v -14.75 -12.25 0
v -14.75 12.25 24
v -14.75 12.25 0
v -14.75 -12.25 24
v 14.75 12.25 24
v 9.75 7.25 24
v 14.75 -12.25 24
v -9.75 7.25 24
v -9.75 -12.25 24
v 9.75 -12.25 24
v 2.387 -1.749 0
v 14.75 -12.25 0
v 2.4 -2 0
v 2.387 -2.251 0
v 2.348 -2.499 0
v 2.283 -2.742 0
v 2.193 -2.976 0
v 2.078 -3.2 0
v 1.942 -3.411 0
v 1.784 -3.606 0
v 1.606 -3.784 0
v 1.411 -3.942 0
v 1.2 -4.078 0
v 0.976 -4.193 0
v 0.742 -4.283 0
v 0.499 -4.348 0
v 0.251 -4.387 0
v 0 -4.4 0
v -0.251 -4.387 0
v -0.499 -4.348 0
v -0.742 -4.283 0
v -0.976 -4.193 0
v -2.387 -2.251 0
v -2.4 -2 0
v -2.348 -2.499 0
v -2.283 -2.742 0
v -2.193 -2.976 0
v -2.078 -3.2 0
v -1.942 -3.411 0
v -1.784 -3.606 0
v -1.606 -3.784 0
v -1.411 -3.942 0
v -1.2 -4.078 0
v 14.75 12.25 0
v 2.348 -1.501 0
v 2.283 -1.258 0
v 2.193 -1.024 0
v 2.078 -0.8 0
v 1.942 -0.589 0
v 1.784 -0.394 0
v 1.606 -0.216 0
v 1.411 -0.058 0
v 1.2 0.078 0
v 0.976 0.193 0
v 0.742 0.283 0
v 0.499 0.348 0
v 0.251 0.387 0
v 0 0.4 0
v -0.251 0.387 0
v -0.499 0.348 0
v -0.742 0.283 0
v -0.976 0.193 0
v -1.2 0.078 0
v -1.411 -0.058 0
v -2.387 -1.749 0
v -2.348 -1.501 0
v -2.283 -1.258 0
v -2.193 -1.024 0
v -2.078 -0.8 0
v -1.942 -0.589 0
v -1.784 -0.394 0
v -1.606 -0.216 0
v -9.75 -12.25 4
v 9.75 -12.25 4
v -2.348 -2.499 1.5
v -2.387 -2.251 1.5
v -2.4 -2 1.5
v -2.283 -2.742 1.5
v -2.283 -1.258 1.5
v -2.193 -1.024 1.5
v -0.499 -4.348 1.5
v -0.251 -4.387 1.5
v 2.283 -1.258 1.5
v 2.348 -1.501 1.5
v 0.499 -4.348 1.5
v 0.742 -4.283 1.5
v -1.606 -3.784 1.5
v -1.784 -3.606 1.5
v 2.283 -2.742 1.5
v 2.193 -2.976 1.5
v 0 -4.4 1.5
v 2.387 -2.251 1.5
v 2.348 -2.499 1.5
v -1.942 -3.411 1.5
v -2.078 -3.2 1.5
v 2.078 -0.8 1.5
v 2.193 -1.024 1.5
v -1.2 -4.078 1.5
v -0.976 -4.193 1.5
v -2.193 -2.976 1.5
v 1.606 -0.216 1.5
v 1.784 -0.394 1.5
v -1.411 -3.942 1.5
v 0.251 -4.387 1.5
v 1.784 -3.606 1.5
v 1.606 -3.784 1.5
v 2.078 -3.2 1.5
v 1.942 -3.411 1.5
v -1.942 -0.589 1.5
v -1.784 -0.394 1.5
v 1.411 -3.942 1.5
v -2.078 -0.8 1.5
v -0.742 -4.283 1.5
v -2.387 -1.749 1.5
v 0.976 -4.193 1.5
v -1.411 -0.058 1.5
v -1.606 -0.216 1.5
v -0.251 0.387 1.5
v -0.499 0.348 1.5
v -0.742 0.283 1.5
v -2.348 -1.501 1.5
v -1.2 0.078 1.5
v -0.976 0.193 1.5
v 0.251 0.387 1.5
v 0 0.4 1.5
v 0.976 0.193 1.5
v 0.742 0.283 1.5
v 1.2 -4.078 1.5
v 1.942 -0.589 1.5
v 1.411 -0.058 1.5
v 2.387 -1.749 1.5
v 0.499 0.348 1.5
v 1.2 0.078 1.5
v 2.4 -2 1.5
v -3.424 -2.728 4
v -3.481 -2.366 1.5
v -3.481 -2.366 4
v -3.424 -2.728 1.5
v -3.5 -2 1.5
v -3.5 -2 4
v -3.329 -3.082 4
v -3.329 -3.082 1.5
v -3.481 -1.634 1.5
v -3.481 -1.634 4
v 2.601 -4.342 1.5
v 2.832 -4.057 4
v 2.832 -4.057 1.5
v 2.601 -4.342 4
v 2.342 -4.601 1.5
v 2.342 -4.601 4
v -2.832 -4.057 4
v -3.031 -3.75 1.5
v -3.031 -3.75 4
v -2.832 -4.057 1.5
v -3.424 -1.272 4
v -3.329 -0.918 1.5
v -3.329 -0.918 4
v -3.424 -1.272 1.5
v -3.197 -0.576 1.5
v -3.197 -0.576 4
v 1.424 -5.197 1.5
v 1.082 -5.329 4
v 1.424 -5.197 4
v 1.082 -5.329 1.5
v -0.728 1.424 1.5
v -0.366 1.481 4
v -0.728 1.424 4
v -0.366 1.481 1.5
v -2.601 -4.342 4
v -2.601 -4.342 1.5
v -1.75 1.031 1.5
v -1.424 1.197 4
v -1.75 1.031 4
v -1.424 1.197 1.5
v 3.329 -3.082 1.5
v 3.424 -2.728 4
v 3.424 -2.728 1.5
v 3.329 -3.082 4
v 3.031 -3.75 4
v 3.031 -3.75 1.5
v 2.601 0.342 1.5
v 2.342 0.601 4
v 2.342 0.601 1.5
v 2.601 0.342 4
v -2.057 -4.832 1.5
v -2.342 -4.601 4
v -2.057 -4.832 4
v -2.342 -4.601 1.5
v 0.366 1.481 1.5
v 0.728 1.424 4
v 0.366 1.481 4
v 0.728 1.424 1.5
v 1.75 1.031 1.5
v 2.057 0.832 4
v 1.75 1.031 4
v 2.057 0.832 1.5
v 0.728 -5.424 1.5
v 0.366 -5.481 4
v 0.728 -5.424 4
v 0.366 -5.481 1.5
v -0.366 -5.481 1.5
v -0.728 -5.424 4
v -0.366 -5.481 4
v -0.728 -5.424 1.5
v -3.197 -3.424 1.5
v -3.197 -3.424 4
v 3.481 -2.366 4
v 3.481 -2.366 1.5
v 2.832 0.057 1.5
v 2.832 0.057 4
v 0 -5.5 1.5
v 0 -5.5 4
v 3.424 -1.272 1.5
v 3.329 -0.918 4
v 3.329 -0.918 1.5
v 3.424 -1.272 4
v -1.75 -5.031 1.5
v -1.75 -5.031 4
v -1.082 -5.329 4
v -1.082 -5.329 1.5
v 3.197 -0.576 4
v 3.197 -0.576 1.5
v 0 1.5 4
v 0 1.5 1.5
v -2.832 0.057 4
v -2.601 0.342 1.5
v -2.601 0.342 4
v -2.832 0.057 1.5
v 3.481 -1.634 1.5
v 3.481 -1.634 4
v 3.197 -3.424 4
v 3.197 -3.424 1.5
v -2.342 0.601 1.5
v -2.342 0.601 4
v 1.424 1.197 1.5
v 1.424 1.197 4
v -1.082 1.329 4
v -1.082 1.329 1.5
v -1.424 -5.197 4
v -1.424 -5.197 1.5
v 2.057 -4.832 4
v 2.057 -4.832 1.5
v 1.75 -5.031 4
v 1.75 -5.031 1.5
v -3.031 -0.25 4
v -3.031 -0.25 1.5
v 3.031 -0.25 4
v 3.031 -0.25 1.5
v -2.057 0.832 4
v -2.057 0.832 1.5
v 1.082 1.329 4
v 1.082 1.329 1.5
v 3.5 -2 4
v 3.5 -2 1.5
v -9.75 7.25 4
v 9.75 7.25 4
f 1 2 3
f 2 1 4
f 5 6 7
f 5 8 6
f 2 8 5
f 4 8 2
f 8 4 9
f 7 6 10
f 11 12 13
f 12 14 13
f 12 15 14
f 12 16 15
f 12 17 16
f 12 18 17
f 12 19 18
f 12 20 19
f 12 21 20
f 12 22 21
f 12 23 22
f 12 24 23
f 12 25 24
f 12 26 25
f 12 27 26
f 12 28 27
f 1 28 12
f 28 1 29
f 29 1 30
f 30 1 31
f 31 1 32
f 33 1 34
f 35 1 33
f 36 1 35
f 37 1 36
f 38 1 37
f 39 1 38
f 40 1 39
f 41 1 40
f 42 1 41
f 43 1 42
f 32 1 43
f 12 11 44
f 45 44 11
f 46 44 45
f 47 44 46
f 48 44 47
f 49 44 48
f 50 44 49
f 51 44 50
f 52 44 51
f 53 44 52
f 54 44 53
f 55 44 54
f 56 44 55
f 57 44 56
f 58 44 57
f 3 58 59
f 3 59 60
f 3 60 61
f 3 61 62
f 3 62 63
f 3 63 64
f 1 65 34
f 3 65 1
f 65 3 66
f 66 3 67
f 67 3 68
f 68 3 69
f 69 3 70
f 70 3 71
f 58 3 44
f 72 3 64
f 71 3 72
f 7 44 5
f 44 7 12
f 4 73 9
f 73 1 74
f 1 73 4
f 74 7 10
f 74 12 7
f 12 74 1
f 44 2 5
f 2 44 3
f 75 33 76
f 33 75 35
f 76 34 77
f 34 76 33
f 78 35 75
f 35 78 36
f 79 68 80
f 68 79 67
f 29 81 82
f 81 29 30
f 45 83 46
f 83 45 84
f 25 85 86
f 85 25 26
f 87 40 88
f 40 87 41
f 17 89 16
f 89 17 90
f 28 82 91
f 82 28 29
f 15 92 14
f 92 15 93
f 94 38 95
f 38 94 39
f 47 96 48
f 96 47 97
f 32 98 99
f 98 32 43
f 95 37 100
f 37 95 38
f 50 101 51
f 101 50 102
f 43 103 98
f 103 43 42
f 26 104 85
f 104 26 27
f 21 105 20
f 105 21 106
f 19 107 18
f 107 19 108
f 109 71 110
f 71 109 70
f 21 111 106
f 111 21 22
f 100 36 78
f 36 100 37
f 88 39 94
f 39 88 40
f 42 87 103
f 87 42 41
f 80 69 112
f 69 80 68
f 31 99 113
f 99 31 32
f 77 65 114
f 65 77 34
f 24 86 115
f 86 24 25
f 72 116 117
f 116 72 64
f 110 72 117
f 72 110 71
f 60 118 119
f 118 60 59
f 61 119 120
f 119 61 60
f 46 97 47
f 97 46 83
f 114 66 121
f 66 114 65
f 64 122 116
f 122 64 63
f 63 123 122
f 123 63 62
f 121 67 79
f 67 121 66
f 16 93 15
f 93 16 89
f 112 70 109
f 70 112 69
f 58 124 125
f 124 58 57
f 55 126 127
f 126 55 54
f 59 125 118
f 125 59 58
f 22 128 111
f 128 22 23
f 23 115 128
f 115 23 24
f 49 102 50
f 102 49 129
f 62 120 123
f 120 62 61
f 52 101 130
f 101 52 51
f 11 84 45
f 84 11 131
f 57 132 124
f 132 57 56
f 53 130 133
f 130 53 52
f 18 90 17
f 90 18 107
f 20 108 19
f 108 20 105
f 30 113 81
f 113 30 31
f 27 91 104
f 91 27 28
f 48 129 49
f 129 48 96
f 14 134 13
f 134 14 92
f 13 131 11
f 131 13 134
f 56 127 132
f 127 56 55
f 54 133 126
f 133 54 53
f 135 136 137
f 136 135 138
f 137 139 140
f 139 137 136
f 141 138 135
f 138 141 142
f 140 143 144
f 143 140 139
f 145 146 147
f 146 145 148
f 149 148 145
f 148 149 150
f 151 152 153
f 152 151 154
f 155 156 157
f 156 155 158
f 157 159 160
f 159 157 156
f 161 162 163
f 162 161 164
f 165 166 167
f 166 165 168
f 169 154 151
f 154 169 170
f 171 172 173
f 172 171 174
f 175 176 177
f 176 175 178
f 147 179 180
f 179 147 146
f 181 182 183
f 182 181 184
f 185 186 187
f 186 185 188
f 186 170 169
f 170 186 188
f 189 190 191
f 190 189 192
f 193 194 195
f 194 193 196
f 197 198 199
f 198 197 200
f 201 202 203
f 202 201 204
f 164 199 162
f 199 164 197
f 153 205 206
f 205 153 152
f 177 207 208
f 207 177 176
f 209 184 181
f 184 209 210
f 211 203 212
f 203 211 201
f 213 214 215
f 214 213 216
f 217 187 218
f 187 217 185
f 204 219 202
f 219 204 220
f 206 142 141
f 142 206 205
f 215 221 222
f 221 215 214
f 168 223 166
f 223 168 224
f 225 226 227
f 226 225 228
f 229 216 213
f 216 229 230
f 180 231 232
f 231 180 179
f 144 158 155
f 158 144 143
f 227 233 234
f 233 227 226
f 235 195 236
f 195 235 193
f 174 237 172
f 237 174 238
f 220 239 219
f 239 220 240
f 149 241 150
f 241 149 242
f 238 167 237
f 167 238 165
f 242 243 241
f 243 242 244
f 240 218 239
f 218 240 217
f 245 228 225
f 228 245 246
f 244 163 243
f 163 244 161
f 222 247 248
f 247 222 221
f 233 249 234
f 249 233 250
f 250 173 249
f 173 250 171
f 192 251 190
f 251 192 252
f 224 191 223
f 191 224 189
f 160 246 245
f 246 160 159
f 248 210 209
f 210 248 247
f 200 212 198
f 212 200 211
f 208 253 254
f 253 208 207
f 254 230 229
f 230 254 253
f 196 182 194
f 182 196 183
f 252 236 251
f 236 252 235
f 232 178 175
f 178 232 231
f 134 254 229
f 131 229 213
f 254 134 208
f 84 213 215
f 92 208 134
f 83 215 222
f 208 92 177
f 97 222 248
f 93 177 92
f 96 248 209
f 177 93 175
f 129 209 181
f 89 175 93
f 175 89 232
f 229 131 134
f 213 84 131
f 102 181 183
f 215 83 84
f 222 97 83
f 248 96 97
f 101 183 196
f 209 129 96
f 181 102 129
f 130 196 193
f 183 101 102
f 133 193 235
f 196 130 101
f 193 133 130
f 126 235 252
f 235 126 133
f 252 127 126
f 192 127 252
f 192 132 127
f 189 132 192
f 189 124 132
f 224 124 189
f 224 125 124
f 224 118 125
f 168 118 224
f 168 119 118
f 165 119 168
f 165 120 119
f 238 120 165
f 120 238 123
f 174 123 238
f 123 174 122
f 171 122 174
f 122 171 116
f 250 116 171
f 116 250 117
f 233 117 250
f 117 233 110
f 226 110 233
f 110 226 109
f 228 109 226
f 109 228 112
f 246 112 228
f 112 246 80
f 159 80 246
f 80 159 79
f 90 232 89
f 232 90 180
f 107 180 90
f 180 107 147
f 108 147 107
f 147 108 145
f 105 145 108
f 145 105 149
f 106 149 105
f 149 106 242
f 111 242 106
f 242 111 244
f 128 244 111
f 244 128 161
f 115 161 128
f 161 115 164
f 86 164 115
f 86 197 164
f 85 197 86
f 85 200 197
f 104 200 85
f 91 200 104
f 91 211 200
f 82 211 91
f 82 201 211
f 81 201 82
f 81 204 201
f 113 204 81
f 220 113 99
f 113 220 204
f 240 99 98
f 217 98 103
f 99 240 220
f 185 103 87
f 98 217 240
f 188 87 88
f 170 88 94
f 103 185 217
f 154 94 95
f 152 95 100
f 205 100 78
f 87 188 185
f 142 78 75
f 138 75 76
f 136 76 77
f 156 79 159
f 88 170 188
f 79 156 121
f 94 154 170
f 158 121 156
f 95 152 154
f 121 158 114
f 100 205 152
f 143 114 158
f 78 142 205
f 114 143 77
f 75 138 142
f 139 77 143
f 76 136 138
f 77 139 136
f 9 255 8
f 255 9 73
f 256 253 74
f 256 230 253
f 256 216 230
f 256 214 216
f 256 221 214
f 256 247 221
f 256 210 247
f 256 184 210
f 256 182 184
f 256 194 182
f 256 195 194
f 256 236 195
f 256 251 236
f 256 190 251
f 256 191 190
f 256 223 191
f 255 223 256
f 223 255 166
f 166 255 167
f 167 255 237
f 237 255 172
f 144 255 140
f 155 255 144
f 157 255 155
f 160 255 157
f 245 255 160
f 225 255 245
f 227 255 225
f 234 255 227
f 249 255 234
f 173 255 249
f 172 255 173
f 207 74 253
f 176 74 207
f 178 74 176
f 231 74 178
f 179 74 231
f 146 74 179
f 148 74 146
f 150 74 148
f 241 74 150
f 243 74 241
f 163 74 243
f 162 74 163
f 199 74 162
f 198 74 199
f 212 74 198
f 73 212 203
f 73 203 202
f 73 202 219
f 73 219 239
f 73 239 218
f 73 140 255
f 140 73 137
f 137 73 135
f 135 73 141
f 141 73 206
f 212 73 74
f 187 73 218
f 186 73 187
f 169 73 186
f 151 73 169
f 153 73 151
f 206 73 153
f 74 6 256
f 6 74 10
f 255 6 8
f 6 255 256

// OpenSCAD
//Square Rod or Tubing Bracket
//Designed by Bryscus: Bryce B.

//Number of Holes
Num_Holes=1; //[1:2]

//Extension Distance
ED=20;

//Tubing Width
TW=19.5;

//Tubing Slot Wall Thickness
WT=5;

//Screw Hole Radius
SHR=2.4;

//(1 Hole) Screw Head Size (radius)
SHS=3.5;

//(1 Hole) Screw Head Depth
SHD=2.5;

//(2 Holes) Screw Bracket Oversizing
SBO=0;

//(2 Holes) Screw Bracket Tab Length
TL=20;

//(2 Holes) Screw Distance
SD=9;

//Mount Thickness
MT=4;

//(2 Holes) Screw Bracket Fillet Radius
FR=5;

if(Num_Holes == 1)
{
rotate([0,0,180])
difference(){
translate([0,0,ED/2+MT/2])
	cube([TW+(WT*2), TW+WT, ED+MT],center=true);
translate([0,MT/2,MT/2])
	cylinder(h=MT+5, r=SHR,$fn=60,center=true); // screw hole
translate([0,MT/2,MT-SHD])
	cylinder(h=SHD+1, r=SHS,$fn=60); // screw head hole
translate([0,WT,(ED+5)/2+MT])
	cube([TW,TW+WT,ED+5],center=true);
}
}

if(Num_Holes == 2)
{
rotate([0,0,180])
difference(){
union(){
	translate([-(TW+(WT*2)+SBO*2-FR*2)/2,-(TW+WT*2+(TL-FR)*2)/2,0]) 
	minkowski(){
		cube([TW+(WT*2)+SBO*2-FR*2,TW+WT*2+(TL-FR)*2,MT/2]); // Screw Bracket
		cylinder(r=FR, h=MT/2,$fn=60);
	}
	translate([0,0,ED/2+MT])
		cube([TW+(WT*2), TW+WT*2, ED],center=true); //Tube Holder Outside
}
translate([0,TL/2+WT+TW/2,MT/2])  //TW+SD
	cylinder(h=MT+5, r=SHR,$fn=60,center=true); //screw hole
translate([0,-(TL/2+WT+TW/2),MT/2])  //-(TL/2+TW/4+WT/2)
	cylinder(h=MT+5, r=SHR,$fn=60,center=true); // screw hole
translate([0,WT,(ED+5)/2+MT])
	cube([TW,TW+WT*2,ED+5],center=true); //tubing opening
}
}

